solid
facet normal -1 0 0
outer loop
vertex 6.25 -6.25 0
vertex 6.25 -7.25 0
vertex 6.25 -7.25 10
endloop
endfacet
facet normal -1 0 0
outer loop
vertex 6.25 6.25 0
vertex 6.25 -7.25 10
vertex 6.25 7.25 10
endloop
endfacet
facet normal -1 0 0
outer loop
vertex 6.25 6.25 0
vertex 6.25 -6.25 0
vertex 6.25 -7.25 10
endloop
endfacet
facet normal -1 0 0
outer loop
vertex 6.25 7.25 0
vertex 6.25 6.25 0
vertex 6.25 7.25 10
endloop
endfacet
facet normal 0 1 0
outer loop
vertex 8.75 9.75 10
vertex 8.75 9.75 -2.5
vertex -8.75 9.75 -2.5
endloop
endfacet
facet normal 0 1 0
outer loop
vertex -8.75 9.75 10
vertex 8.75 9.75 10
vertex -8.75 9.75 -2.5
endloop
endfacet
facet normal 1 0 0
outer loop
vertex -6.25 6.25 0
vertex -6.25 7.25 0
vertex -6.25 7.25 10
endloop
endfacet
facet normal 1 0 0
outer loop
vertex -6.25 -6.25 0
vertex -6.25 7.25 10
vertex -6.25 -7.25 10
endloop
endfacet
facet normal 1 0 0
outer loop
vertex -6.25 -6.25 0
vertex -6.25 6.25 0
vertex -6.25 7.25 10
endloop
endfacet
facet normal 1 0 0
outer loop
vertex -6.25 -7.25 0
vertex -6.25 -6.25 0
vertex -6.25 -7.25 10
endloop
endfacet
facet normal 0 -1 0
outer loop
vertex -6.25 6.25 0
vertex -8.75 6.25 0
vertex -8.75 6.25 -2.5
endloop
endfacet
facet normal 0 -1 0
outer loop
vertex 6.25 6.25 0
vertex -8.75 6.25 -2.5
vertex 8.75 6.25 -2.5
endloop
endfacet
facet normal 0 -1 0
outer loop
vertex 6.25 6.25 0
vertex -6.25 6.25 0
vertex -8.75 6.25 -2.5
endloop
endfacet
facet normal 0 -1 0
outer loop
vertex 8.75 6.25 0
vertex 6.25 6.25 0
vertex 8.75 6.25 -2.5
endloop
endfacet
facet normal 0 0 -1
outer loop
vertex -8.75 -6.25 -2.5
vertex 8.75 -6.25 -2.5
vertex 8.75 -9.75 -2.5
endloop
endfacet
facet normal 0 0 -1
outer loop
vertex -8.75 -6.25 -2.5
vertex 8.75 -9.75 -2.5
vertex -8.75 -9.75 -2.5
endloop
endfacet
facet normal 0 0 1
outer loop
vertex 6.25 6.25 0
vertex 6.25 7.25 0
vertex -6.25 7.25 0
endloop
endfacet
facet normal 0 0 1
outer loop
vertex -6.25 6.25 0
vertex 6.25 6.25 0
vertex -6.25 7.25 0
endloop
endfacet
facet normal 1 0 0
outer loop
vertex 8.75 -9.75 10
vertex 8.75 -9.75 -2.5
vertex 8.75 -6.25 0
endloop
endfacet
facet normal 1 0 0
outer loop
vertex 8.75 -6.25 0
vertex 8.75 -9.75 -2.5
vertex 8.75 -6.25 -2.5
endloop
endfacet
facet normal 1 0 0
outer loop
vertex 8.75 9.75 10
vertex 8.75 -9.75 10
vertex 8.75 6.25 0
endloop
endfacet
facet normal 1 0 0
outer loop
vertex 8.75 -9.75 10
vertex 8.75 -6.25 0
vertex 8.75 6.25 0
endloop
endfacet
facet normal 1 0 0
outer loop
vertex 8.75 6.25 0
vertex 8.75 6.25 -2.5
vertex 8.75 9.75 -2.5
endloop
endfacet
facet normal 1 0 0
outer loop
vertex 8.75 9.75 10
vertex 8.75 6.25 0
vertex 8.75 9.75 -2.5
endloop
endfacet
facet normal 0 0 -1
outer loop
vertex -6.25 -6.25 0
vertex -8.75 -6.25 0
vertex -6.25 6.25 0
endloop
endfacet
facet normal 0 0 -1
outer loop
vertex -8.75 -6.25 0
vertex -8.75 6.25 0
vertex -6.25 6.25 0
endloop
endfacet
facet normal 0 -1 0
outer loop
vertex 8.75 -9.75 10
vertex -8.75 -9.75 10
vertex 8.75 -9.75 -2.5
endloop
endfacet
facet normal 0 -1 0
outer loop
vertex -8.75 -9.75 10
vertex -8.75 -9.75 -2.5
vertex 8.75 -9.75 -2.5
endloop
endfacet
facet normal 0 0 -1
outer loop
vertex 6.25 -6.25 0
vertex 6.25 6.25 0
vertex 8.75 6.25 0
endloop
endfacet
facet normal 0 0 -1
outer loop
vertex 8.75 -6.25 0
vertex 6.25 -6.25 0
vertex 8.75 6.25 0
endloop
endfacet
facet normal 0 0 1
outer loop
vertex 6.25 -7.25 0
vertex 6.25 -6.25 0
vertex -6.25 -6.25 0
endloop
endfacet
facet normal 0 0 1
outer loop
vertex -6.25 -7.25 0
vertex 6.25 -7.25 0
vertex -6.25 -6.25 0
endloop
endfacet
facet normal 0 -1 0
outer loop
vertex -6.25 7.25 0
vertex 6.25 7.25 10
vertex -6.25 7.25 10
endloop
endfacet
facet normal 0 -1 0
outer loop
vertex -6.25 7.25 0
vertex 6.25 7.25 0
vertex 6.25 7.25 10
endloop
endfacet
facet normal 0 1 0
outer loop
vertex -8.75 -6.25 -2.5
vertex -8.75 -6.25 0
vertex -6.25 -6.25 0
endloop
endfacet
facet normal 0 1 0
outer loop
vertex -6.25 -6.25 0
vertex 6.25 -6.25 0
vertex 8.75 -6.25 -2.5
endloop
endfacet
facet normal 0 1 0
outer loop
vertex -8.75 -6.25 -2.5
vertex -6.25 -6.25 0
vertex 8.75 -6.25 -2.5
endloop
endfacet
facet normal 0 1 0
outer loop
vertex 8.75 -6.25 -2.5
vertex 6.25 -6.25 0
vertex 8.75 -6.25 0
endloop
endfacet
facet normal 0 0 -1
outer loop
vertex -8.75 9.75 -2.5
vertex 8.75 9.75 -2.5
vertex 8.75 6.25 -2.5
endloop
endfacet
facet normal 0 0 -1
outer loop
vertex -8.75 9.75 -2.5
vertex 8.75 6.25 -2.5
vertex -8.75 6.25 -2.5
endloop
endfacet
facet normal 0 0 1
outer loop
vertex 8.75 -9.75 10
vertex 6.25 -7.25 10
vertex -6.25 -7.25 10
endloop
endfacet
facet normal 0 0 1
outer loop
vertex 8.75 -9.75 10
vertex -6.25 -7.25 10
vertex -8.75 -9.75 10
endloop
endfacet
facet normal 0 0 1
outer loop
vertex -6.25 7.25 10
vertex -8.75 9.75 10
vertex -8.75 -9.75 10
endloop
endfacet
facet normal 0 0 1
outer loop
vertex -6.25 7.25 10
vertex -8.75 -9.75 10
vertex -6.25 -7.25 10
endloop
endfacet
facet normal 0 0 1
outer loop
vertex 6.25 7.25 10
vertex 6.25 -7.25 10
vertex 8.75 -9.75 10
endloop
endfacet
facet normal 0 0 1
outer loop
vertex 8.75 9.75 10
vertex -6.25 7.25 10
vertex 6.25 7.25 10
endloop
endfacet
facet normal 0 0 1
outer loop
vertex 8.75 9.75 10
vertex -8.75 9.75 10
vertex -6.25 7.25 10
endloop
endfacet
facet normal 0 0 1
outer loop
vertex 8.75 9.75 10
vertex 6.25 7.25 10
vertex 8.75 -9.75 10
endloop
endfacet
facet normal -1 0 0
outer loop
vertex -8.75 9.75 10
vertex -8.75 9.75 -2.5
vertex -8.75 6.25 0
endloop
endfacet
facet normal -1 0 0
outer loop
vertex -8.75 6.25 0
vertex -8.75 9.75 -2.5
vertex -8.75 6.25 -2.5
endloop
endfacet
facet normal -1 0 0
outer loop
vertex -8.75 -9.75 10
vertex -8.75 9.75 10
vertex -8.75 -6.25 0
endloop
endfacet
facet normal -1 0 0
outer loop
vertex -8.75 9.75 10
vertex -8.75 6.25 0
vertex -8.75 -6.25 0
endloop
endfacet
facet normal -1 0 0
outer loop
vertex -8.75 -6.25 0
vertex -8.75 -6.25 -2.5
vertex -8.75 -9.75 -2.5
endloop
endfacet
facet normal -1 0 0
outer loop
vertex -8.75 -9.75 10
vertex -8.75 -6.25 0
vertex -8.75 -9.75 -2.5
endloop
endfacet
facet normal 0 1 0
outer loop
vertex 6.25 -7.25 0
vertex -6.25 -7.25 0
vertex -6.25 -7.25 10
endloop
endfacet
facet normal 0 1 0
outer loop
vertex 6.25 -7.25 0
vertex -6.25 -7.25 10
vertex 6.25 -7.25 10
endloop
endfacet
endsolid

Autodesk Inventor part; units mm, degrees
ref_plane "YZ Plane" through (0, 0, 0) normal (1, 0, 0) x (0, 1, 0)
ref_plane "XZ Plane" through (0, 0, 0) normal (0, 1, 0) x (-1, 0, 0)
ref_plane "XY Plane" through (0, 0, 0) normal (0, 0, 1) x (1, 0, 0)
sketch "Sketch1" plane through (0, 0, 0) normal (0, 0, 1) x (1, 0, 0)
  line L0 (-6.25, -7.25) -> (6.25, -7.25)
  line L1 (6.25, -7.25) -> (6.25, 7.25)
  line L2 (6.25, 7.25) -> (-6.25, 7.25)
  line L3 (-6.25, 7.25) -> (-6.25, -7.25)
  line L4 (-6.25, -7.25) -> (6.25, 7.25) construction
  line L5 (6.25, -7.25) -> (-6.25, 7.25) construction
  line L6 (-8.75, -9.75) -> (8.75, -9.75)
  line L7 (8.75, -9.75) -> (8.75, 9.75)
  line L8 (8.75, 9.75) -> (-8.75, 9.75)
  line L9 (-8.75, 9.75) -> (-8.75, -9.75)
  line L10 (-8.75, -9.75) -> (8.75, 9.75) construction
  line L11 (8.75, -9.75) -> (-8.75, 9.75) construction
  point P0 (0, 0)
  dimension "d0" = 12.5
  dimension "d1" = 14.5
  dimension "d2" = 17.5
  dimension "d3" = 19.5
extrude "Extrusion1" add sketch "Sketch1" along normal blind 10
sketch "Sketch2" plane through (0, 0, 0) normal (0, 0, -1) x (-1, 0, 0)
  line L0 (8.75, 9.75) -> (8.75, -9.75) projected
  line L1 (-8.75, 9.75) -> (8.75, 9.75)
  line L2 (8.75, 9.75) -> (8.75, 6.25)
  line L3 (8.75, 6.25) -> (-8.75, 6.25)
  line L4 (-8.75, 6.25) -> (-8.75, 9.75)
  line L5 (6.25, 7.25) -> (-6.25, 7.25) projected
  line L6 (-8.75, -9.75) -> (-8.75, 9.75) projected
  line L7 (-8.75, -9.75) -> (8.75, -9.75)
  line L8 (8.75, -9.75) -> (8.75, -6.25)
  line L9 (8.75, -6.25) -> (-8.75, -6.25)
  line L10 (-8.75, -6.25) -> (-8.75, -9.75)
  line L11 (-6.25, -7.25) -> (6.25, -7.25) projected
  point P0 (0, 0)
  point P1 (-8.75, -6.25)
  dimension "d6" = 1
  dimension "d7" = 1
extrude "Extrusion2" add sketch "Sketch2" along normal blind 2.5 contours L0 L3 L4 L1 | L0 L7 L6 L9
properties part number "Adafruit_1528_4663-ND_House_02"
